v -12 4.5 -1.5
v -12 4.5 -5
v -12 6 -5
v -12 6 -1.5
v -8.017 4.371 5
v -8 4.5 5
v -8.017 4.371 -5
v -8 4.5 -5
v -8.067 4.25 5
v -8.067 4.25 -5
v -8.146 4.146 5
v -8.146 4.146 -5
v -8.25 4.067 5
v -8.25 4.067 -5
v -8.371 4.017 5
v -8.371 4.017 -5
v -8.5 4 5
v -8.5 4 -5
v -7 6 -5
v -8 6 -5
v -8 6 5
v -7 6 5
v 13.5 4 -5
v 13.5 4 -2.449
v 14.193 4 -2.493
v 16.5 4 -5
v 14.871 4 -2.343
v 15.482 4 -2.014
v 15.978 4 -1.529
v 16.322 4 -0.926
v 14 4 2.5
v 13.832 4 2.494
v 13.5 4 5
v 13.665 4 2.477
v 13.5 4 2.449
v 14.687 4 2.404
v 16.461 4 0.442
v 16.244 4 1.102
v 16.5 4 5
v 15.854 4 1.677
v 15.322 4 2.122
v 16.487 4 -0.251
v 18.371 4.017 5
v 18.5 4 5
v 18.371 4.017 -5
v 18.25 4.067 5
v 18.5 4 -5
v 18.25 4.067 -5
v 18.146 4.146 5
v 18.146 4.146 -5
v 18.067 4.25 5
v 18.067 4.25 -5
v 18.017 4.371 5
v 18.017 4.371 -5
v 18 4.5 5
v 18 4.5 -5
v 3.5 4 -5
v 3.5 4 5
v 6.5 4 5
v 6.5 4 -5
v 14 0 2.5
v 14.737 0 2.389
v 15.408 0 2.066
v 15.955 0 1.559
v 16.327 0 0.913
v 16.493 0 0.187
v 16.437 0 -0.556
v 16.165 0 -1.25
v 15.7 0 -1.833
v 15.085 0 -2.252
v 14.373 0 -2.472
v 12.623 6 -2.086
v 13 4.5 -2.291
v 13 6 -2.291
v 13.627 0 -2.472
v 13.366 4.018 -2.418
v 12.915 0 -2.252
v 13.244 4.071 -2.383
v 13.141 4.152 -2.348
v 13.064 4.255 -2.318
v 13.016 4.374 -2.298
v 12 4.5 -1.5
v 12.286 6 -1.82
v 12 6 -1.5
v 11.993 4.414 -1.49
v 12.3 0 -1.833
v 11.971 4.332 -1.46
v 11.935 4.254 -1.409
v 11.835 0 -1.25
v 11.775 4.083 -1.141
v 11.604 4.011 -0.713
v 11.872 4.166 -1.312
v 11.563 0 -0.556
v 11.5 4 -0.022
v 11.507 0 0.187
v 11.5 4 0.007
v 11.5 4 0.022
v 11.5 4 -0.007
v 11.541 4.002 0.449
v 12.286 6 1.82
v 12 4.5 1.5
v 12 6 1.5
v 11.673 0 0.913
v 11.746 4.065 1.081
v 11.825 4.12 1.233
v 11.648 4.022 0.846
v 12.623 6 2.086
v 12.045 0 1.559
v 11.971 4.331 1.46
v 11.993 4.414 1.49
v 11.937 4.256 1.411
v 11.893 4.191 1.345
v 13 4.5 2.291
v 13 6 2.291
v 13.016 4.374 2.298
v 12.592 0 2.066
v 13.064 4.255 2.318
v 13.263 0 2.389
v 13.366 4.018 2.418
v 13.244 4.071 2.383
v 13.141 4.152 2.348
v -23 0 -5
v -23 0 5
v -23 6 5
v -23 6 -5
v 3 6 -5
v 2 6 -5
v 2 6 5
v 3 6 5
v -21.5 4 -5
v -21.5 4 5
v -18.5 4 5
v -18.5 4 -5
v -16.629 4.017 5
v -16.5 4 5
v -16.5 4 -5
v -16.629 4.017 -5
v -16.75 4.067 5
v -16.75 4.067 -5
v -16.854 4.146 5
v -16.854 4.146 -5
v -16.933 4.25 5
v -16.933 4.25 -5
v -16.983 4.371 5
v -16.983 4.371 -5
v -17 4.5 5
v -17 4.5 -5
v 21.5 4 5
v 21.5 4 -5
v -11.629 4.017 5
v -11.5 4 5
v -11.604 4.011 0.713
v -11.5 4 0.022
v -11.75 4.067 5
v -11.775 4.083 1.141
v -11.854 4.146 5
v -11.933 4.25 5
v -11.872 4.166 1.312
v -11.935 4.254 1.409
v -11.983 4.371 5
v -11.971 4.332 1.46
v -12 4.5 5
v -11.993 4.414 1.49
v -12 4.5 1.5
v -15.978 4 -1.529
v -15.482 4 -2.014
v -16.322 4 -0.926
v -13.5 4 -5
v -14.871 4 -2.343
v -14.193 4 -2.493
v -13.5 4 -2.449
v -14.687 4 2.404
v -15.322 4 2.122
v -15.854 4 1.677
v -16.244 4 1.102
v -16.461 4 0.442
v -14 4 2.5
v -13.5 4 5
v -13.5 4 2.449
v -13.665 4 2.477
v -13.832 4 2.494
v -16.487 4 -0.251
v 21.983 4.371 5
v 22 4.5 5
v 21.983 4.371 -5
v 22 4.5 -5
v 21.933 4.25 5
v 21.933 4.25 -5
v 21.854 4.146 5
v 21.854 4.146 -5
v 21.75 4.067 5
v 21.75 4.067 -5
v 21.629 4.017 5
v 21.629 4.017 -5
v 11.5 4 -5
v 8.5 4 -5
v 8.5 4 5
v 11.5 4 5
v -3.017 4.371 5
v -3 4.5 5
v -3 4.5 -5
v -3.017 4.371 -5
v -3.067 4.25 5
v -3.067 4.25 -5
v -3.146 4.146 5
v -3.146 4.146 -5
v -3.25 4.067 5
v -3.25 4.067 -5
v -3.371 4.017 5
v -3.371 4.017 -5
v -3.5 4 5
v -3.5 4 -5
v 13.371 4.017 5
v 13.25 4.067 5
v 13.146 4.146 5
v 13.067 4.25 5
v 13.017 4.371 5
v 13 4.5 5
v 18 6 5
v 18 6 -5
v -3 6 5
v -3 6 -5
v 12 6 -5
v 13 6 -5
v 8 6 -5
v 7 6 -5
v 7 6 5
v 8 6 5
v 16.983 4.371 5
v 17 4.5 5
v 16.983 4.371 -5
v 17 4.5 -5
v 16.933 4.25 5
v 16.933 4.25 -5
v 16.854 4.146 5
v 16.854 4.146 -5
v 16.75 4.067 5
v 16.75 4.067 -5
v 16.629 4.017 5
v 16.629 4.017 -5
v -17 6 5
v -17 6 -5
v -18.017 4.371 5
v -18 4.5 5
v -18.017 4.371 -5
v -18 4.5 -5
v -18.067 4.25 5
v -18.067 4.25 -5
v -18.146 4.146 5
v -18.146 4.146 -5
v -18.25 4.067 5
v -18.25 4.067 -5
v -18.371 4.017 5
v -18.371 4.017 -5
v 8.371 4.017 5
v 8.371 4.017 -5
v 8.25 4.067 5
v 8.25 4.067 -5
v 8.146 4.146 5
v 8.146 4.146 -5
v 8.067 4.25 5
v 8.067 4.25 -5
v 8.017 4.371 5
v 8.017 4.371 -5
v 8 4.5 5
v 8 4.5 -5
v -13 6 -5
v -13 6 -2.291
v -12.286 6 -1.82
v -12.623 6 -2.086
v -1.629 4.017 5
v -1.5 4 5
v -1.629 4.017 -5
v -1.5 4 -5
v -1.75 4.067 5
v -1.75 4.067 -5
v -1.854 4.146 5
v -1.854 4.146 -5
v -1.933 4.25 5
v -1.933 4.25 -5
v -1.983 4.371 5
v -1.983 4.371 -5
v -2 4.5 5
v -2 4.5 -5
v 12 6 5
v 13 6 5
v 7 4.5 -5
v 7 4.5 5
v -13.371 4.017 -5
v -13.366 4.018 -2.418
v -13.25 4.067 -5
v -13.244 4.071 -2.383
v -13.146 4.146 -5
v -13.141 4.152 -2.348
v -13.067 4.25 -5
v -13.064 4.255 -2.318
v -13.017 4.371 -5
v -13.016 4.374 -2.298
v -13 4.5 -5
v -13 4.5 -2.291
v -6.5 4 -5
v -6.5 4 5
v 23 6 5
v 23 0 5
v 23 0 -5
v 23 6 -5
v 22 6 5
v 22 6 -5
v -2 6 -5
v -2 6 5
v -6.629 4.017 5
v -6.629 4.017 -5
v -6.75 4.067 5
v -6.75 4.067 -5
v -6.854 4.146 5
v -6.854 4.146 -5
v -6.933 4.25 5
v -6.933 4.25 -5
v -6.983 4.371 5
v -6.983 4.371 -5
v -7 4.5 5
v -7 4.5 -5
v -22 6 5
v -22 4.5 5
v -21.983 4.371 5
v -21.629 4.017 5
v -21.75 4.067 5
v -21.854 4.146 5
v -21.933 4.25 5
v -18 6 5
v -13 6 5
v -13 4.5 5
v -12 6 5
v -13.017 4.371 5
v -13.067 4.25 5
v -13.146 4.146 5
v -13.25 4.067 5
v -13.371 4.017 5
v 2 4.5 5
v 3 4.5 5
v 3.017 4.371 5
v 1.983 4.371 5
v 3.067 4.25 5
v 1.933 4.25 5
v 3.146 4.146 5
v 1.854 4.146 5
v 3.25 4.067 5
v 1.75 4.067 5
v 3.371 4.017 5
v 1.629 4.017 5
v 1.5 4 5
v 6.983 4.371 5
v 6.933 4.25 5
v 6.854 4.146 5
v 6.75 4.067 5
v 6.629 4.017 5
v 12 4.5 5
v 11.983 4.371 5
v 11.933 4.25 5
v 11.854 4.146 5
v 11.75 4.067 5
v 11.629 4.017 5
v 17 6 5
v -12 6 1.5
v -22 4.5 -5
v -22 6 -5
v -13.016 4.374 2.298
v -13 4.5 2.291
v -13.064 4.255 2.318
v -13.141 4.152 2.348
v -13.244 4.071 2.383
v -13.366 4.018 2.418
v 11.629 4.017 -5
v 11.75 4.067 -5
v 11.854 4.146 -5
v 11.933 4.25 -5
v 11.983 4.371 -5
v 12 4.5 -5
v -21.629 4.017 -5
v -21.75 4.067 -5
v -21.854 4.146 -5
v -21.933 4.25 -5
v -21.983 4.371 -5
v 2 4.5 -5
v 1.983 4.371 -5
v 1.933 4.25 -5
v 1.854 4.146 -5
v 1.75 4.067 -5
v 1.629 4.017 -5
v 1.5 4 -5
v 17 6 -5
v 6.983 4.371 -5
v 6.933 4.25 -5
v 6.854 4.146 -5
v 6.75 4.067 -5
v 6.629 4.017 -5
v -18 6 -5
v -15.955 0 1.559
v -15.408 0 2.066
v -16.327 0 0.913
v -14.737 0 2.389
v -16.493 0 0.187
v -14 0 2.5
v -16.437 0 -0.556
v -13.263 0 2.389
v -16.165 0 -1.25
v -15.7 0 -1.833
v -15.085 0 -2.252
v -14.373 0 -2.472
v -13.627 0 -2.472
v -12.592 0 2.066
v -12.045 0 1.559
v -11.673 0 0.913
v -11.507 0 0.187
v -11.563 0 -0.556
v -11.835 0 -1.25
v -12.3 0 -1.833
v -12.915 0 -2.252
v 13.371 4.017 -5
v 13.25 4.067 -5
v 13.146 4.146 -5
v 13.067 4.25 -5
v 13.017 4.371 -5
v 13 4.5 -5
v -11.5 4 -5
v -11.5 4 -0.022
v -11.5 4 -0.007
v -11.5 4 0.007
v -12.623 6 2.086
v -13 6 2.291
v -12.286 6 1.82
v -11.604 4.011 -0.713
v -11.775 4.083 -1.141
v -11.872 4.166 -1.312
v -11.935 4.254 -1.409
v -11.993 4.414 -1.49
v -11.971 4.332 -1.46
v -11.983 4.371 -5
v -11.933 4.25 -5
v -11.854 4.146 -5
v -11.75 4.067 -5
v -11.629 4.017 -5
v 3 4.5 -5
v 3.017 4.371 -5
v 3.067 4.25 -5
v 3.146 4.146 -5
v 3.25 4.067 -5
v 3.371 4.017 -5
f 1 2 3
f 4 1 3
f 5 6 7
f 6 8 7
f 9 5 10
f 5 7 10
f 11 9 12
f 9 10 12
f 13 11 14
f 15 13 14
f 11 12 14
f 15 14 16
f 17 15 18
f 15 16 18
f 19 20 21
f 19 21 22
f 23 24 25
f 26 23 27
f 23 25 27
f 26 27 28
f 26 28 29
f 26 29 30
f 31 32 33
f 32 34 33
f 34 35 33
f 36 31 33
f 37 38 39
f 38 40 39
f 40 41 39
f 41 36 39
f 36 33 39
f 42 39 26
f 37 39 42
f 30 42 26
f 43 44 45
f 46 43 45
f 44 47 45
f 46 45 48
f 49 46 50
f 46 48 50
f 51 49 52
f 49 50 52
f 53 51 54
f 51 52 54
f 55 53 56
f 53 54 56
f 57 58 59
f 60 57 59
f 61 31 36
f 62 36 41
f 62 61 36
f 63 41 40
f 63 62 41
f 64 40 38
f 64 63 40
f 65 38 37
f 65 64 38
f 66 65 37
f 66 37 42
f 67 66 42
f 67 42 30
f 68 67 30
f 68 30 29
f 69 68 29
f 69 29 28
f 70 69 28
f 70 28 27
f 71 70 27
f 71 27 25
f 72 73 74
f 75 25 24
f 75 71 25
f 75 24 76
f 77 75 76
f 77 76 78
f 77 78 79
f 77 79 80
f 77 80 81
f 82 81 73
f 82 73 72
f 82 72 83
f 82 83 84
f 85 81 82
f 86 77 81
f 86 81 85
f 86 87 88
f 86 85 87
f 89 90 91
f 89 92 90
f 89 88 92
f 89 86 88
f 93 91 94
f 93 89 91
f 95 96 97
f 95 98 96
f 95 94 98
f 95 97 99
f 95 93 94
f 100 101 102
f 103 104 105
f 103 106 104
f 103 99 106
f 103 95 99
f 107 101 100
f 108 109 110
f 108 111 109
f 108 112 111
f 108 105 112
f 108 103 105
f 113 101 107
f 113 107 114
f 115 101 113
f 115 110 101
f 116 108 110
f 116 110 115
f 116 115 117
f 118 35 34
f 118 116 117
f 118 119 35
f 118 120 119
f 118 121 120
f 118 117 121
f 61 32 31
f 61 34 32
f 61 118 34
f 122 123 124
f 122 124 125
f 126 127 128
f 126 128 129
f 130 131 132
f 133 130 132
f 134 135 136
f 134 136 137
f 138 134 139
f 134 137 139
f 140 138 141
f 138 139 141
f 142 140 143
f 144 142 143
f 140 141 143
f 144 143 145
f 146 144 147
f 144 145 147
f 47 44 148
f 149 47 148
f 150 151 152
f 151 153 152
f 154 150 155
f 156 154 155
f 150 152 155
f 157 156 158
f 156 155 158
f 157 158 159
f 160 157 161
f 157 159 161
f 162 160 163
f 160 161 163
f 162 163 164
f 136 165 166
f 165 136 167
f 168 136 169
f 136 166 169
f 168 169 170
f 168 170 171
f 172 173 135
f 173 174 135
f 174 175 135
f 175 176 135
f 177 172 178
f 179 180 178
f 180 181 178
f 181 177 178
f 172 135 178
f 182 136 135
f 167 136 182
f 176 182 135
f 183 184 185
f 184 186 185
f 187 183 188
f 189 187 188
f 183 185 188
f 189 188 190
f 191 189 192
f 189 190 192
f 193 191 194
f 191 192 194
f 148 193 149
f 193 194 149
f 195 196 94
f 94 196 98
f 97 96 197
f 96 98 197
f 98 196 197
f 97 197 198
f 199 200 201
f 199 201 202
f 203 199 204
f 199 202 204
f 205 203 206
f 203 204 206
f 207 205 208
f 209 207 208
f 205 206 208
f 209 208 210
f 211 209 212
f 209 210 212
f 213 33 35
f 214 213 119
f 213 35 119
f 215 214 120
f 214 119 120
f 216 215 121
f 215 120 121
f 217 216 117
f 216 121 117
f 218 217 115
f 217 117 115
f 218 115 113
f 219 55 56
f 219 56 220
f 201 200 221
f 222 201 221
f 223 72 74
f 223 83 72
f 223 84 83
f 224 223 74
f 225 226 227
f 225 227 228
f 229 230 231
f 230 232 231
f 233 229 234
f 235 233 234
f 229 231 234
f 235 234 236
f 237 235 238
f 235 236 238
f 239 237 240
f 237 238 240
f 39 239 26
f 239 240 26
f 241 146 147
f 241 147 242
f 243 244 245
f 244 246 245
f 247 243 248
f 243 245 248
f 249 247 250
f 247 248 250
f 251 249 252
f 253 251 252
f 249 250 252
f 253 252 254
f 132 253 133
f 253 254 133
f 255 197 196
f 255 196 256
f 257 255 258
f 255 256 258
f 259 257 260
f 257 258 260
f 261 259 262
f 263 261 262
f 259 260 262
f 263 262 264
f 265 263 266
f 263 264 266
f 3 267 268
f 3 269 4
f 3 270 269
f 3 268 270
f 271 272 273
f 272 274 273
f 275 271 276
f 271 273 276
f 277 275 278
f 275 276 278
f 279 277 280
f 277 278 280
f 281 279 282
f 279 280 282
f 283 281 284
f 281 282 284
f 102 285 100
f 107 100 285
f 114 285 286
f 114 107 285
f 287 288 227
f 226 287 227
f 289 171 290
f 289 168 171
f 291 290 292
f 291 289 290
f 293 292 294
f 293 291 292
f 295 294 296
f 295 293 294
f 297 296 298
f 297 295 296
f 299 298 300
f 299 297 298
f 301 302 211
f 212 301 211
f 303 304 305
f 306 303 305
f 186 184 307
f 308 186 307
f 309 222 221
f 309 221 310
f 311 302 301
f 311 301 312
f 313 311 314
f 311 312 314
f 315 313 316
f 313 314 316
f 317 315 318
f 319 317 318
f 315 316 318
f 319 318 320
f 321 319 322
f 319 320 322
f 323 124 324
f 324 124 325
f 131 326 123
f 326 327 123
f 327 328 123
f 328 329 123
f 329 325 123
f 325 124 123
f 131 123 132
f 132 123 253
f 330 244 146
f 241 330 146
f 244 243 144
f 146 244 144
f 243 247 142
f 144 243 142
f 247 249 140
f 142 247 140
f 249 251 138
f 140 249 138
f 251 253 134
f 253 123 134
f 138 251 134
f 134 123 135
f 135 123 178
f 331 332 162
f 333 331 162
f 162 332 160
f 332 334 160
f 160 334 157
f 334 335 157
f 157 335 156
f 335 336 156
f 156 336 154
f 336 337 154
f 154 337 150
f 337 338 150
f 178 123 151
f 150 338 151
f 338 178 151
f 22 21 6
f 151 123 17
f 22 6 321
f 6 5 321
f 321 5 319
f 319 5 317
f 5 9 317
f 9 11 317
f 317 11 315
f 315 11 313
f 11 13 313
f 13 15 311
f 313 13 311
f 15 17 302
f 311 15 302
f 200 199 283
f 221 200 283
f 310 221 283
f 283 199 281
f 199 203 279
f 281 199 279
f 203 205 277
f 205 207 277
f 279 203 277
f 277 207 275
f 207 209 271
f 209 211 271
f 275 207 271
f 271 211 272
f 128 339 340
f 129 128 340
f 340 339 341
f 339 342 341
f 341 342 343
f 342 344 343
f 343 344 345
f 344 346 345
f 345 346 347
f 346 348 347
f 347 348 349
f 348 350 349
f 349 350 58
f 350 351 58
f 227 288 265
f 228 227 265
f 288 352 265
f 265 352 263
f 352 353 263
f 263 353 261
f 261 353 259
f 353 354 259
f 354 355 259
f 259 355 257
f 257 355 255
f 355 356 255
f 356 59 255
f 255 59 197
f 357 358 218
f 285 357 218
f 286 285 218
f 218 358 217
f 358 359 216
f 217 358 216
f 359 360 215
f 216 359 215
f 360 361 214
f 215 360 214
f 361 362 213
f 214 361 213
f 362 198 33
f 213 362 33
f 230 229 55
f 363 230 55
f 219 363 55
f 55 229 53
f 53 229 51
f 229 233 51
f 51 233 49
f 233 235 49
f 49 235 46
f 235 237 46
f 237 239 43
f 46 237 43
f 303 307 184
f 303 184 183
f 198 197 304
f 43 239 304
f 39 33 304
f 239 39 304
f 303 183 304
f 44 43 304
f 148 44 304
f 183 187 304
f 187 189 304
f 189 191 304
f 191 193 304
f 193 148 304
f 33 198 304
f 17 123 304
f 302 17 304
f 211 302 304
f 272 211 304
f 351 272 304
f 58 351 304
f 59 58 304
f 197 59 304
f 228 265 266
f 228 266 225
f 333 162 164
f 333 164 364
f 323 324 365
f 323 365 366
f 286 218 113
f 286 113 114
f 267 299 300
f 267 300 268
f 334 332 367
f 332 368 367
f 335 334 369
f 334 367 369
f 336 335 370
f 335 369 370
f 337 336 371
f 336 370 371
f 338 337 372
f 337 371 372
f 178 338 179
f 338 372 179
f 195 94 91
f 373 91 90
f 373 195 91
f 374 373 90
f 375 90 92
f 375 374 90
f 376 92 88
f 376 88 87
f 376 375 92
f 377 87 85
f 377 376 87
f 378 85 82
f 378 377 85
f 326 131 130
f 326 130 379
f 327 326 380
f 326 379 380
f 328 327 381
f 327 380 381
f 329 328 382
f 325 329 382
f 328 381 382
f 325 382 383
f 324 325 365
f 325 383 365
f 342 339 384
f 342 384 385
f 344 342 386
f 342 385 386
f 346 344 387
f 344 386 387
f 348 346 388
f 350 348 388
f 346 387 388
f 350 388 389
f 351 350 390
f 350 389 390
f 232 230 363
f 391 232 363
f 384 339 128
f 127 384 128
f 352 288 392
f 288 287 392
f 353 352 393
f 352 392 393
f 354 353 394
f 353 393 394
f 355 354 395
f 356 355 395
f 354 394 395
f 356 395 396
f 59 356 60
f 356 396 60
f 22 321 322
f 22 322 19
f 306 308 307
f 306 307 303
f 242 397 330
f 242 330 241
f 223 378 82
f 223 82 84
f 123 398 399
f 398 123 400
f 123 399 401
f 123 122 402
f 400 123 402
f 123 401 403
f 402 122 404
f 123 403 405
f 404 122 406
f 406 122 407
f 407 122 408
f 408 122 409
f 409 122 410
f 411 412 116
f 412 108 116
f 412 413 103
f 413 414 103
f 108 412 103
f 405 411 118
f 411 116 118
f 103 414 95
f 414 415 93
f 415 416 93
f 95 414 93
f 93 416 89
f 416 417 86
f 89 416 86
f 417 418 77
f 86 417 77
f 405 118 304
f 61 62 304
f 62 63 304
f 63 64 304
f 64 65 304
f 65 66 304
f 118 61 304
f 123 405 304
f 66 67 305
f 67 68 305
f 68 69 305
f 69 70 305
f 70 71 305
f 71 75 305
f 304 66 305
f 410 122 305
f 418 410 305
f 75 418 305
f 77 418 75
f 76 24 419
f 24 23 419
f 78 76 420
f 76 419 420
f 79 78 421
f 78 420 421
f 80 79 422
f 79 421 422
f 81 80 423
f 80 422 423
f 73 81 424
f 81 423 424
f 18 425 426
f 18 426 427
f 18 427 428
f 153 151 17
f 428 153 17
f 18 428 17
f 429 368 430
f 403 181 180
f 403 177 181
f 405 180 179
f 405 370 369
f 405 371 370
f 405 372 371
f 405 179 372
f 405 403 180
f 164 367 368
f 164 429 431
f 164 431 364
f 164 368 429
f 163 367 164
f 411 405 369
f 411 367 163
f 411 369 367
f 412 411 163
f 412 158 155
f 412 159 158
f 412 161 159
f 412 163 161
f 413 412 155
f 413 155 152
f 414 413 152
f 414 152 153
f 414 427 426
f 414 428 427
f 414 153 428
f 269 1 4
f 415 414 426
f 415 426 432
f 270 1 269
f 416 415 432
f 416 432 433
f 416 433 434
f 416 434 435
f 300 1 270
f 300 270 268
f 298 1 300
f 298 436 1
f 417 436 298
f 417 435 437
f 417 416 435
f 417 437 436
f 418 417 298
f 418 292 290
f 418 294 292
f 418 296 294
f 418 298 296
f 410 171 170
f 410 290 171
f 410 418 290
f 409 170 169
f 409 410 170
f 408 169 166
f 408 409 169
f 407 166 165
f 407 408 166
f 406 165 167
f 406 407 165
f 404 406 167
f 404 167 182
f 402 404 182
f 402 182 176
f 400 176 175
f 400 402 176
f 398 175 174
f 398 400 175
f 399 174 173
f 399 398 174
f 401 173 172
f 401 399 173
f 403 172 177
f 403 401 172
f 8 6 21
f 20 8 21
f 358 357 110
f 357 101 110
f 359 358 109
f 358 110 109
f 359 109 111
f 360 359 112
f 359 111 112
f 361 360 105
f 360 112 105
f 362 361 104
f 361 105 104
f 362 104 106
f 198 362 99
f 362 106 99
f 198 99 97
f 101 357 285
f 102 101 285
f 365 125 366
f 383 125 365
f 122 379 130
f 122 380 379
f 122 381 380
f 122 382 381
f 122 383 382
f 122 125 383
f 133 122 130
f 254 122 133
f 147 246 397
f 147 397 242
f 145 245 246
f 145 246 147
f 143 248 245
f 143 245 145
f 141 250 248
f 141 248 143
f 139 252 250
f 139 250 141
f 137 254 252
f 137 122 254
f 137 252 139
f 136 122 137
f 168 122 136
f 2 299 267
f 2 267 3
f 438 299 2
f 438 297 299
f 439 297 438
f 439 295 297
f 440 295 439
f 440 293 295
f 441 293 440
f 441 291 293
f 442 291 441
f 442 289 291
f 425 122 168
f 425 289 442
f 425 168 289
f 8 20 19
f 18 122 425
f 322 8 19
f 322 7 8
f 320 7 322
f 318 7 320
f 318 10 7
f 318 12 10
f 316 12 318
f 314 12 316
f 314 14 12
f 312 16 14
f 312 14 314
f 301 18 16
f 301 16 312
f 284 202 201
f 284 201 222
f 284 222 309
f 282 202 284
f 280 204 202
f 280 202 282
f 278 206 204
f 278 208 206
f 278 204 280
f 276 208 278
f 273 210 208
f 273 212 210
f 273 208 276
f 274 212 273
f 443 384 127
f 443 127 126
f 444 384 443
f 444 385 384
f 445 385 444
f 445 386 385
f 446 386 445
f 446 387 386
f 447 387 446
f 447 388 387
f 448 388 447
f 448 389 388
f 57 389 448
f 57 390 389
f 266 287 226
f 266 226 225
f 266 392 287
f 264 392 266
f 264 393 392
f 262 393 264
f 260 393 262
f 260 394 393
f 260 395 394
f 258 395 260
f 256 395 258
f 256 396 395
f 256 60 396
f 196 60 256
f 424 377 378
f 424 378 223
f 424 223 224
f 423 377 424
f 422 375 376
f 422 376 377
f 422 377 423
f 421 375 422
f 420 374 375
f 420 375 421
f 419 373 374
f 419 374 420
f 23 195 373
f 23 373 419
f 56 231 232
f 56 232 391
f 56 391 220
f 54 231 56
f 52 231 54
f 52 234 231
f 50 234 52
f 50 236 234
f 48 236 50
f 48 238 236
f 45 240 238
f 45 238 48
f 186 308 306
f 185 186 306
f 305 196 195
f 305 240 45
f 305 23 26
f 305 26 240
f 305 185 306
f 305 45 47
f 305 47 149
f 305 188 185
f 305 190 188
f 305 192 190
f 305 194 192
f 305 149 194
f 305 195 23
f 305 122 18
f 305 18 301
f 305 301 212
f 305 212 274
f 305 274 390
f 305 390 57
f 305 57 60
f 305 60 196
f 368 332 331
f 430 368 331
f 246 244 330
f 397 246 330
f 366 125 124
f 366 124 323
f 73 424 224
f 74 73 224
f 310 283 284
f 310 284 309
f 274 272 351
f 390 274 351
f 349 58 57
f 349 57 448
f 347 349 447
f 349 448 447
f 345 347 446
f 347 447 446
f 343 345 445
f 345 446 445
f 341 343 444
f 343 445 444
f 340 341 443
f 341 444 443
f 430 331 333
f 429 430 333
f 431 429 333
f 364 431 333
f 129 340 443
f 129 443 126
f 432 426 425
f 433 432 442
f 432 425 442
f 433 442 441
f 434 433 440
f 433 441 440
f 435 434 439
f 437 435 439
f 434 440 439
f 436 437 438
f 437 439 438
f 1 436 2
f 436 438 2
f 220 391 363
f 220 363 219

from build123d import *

# Parameters (mm, degrees)
SKETCH1_W           = 46
SKETCH1_H           = 10
SKETCH1_R           = 2.5
BOSS_EXTRUDE1_DEPTH = 6
SKETCH2_W           = 4
SKETCH2_H           = 2
CUT_EXTRUDE1_DEPTH  = 26.787593916
FILLET2_R           = 0.5


with BuildPart() as part:
    # Sketch1 → Boss-Extrude1 (new body)
    with BuildSketch(Plane(origin=(0, 0, 0), x_dir=(1, 0, 0), z_dir=(0, 1, 0))):
        Rectangle(SKETCH1_W, SKETCH1_H)
        with Locations(Location((14, 0, 0), (0, 0, 270))):
            Circle(SKETCH1_R, mode=Mode.SUBTRACT)
        with Locations(Location((-14, 0, 0), (0, 0, 270))):
            Circle(SKETCH1_R, mode=Mode.SUBTRACT)
    extrude(amount=BOSS_EXTRUDE1_DEPTH)

    # Sketch2 → Cut-Extrude1 (cut, through all)
    with BuildSketch(Plane.XY.offset(5)):
        with Locations((-20, 5)):
            Rectangle(SKETCH2_W, SKETCH2_H)
        with Locations((-15, 5)):
            Rectangle(SKETCH2_W, SKETCH2_H)
        with Locations((-10, 5)):
            Rectangle(SKETCH2_W, SKETCH2_H)
        with Locations((-5, 5)):
            Rectangle(SKETCH2_W, SKETCH2_H)
        with Locations((0, 5)):
            Rectangle(SKETCH2_W, SKETCH2_H)
        with Locations((5, 5)):
            Rectangle(SKETCH2_W, SKETCH2_H)
        with Locations((10, 5)):
            Rectangle(SKETCH2_W, SKETCH2_H)
        with Locations((15, 5)):
            Rectangle(SKETCH2_W, SKETCH2_H)
        with Locations((20, 5)):
            Rectangle(SKETCH2_W, SKETCH2_H)
    extrude(amount=-CUT_EXTRUDE1_DEPTH, mode=Mode.SUBTRACT)

    # Fillet2
    fillet2_edges = [part.edges().sort_by_distance(p)[0] for p in [
        (3, 4, 0),
        (7, 4, 0),
        (8, 4, 0),
        (12, 4, 3.25),
        (12, 4, -3.25),
        (13, 4, -3.645643924),
        (13, 4, 3.645643924),
        (17, 4, 0),
        (18, 4, 0),
        (22, 4, 0),
        (-18, 4, 0),
        (-22, 4, 0),
        (-13, 4, 3.645643924),
        (-13, 4, -3.645643924),
        (-17, 4, 0),
        (-12, 4, -3.25),
        (-12, 4, 3.25),
        (-8, 4, 0),
        (-7, 4, 0),
        (-3, 4, 0),
        (-2, 4, 0),
        (2, 4, 0),
    ]]
    fillet(fillet2_edges, radius=FILLET2_R - 0.0001)  # a hair under: the kernel refuses the full size


solid = part.part
